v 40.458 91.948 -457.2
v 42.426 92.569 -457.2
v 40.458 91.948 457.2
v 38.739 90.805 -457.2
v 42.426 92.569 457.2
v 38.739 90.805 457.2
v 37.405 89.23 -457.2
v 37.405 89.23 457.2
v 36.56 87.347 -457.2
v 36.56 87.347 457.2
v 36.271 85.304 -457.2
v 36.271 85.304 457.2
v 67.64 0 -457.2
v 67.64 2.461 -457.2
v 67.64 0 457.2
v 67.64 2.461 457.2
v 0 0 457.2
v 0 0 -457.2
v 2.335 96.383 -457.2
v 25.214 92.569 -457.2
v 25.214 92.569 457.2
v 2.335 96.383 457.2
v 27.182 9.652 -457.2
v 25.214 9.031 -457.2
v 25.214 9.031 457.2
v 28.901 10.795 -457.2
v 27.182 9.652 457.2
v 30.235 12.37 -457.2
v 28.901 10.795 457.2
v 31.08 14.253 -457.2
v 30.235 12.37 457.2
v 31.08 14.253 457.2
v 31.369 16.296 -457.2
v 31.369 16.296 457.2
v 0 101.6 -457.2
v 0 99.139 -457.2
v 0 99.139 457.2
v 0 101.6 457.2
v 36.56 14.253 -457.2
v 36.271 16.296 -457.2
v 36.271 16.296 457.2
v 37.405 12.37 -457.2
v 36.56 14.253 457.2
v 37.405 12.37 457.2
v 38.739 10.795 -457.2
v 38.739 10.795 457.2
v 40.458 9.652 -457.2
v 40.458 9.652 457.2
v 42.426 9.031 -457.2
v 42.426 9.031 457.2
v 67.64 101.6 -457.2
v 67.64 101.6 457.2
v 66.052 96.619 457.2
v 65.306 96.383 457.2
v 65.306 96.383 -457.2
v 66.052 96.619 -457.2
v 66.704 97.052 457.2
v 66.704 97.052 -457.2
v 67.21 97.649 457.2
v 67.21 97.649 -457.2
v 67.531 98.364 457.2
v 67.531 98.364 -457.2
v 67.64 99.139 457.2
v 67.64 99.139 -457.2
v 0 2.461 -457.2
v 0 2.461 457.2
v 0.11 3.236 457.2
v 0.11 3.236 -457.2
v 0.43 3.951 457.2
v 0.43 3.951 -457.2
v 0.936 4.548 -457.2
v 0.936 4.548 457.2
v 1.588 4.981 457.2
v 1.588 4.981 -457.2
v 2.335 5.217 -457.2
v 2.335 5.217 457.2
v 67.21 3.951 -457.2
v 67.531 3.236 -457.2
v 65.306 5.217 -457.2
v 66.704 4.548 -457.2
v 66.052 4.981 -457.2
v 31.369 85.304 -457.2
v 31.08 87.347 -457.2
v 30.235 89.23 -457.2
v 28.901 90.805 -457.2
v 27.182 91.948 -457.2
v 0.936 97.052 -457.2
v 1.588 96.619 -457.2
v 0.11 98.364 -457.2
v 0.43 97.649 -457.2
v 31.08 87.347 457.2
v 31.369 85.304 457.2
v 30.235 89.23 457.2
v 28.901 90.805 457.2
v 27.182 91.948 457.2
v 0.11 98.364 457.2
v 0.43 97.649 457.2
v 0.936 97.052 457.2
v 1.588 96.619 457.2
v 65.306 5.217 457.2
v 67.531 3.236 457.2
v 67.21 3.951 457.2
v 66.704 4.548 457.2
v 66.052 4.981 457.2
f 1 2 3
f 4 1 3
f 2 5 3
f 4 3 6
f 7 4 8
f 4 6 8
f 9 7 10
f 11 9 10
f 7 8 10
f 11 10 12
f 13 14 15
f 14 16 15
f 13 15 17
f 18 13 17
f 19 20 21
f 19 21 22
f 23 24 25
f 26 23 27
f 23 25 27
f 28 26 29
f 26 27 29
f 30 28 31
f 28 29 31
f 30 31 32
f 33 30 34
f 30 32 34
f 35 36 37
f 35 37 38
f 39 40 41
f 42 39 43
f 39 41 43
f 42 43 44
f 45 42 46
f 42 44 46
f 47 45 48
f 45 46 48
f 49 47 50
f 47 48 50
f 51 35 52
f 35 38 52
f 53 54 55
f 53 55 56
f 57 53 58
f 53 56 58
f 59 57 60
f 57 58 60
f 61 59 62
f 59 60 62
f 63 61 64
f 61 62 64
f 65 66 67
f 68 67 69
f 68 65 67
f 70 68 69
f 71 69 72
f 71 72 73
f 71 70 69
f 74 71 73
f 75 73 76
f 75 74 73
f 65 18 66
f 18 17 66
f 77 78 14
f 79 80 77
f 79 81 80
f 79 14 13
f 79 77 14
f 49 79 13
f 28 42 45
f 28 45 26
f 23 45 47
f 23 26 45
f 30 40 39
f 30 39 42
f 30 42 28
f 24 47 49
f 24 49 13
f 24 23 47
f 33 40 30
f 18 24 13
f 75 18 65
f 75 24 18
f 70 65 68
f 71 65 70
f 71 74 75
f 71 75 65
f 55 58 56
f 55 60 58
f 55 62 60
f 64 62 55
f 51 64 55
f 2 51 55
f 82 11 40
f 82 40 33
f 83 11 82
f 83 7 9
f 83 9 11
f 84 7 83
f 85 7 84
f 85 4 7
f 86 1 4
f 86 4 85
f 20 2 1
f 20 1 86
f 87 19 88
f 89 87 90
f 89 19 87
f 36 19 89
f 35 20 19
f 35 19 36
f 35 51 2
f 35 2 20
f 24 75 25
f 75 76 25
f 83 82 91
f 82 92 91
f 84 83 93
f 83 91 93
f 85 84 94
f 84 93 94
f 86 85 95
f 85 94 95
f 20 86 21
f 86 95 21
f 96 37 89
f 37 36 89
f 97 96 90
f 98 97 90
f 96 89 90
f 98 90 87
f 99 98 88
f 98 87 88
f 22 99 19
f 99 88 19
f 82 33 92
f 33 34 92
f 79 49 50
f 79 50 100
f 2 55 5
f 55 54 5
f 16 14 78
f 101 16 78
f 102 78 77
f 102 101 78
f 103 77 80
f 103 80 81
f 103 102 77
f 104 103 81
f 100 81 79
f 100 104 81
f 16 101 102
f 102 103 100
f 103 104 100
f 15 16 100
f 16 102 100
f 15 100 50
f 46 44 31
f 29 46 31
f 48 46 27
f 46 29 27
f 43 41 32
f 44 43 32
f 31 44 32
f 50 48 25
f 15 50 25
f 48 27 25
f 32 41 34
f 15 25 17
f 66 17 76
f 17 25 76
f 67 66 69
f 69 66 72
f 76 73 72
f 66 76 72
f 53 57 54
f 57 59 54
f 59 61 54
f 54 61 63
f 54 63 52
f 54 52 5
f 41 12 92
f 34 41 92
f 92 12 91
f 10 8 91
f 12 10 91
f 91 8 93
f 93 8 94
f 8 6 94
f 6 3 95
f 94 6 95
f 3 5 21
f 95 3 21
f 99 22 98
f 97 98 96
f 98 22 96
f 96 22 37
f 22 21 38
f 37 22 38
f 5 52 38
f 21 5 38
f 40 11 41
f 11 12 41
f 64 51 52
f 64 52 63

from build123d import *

# Parameters (mm, degrees)
BASESBEAM_DEPTH = 457.2
TOEFILLET_R     = 2.794


with BuildPart() as part:
    # Sketch1 → BaseSbeam (new body, symmetric)
    with BuildSketch(Plane.XY):
        with BuildLine():
            Line((0, 0), (0, 4.82792597))
            Line((0, 4.82792597), (25.214048892, 9.030574012))
            ThreePointArc((25.214048892, 9.030574012), (29.623433353, 11.535173088), (31.369, 16.296337329))
            Line((31.369, 16.296337329), (31.369, 85.303662671))
            ThreePointArc((31.369, 85.303662671), (29.623433353, 90.064826912), (25.214048892, 92.569425988))
            Line((25.214048892, 92.569425988), (0, 96.77207403))
            Line((0, 96.77207403), (0, 101.6))
            Line((0, 101.6), (67.6402, 101.6))
            Line((67.6402, 101.6), (67.6402, 96.77207403))
            Line((67.6402, 96.77207403), (42.426151108, 92.569425988))
            ThreePointArc((42.426151108, 92.569425988), (38.016766647, 90.064826912), (36.2712, 85.303662671))
            Line((36.2712, 85.303662671), (36.2712, 16.296337329))
            ThreePointArc((36.2712, 16.296337329), (38.016766647, 11.535173088), (42.426151108, 9.030574012))
            Line((42.426151108, 9.030574012), (67.6402, 4.82792597))
            Line((67.6402, 4.82792597), (67.6402, 0))
            Line((67.6402, 0), (0, 0))
        make_face()
    extrude(amount=BASESBEAM_DEPTH, both=True)

    # ToeFillet
    toefillet_edges = [part.edges().sort_by_distance(p)[0] for p in [
        (67.6402, 4.82792597, 0),
        (67.6402, 96.77207403, 0),
        (0, 96.77207403, 0),
        (0, 4.82792597, 0),
    ]]
    fillet(toefillet_edges, radius=TOEFILLET_R)


solid = part.part
